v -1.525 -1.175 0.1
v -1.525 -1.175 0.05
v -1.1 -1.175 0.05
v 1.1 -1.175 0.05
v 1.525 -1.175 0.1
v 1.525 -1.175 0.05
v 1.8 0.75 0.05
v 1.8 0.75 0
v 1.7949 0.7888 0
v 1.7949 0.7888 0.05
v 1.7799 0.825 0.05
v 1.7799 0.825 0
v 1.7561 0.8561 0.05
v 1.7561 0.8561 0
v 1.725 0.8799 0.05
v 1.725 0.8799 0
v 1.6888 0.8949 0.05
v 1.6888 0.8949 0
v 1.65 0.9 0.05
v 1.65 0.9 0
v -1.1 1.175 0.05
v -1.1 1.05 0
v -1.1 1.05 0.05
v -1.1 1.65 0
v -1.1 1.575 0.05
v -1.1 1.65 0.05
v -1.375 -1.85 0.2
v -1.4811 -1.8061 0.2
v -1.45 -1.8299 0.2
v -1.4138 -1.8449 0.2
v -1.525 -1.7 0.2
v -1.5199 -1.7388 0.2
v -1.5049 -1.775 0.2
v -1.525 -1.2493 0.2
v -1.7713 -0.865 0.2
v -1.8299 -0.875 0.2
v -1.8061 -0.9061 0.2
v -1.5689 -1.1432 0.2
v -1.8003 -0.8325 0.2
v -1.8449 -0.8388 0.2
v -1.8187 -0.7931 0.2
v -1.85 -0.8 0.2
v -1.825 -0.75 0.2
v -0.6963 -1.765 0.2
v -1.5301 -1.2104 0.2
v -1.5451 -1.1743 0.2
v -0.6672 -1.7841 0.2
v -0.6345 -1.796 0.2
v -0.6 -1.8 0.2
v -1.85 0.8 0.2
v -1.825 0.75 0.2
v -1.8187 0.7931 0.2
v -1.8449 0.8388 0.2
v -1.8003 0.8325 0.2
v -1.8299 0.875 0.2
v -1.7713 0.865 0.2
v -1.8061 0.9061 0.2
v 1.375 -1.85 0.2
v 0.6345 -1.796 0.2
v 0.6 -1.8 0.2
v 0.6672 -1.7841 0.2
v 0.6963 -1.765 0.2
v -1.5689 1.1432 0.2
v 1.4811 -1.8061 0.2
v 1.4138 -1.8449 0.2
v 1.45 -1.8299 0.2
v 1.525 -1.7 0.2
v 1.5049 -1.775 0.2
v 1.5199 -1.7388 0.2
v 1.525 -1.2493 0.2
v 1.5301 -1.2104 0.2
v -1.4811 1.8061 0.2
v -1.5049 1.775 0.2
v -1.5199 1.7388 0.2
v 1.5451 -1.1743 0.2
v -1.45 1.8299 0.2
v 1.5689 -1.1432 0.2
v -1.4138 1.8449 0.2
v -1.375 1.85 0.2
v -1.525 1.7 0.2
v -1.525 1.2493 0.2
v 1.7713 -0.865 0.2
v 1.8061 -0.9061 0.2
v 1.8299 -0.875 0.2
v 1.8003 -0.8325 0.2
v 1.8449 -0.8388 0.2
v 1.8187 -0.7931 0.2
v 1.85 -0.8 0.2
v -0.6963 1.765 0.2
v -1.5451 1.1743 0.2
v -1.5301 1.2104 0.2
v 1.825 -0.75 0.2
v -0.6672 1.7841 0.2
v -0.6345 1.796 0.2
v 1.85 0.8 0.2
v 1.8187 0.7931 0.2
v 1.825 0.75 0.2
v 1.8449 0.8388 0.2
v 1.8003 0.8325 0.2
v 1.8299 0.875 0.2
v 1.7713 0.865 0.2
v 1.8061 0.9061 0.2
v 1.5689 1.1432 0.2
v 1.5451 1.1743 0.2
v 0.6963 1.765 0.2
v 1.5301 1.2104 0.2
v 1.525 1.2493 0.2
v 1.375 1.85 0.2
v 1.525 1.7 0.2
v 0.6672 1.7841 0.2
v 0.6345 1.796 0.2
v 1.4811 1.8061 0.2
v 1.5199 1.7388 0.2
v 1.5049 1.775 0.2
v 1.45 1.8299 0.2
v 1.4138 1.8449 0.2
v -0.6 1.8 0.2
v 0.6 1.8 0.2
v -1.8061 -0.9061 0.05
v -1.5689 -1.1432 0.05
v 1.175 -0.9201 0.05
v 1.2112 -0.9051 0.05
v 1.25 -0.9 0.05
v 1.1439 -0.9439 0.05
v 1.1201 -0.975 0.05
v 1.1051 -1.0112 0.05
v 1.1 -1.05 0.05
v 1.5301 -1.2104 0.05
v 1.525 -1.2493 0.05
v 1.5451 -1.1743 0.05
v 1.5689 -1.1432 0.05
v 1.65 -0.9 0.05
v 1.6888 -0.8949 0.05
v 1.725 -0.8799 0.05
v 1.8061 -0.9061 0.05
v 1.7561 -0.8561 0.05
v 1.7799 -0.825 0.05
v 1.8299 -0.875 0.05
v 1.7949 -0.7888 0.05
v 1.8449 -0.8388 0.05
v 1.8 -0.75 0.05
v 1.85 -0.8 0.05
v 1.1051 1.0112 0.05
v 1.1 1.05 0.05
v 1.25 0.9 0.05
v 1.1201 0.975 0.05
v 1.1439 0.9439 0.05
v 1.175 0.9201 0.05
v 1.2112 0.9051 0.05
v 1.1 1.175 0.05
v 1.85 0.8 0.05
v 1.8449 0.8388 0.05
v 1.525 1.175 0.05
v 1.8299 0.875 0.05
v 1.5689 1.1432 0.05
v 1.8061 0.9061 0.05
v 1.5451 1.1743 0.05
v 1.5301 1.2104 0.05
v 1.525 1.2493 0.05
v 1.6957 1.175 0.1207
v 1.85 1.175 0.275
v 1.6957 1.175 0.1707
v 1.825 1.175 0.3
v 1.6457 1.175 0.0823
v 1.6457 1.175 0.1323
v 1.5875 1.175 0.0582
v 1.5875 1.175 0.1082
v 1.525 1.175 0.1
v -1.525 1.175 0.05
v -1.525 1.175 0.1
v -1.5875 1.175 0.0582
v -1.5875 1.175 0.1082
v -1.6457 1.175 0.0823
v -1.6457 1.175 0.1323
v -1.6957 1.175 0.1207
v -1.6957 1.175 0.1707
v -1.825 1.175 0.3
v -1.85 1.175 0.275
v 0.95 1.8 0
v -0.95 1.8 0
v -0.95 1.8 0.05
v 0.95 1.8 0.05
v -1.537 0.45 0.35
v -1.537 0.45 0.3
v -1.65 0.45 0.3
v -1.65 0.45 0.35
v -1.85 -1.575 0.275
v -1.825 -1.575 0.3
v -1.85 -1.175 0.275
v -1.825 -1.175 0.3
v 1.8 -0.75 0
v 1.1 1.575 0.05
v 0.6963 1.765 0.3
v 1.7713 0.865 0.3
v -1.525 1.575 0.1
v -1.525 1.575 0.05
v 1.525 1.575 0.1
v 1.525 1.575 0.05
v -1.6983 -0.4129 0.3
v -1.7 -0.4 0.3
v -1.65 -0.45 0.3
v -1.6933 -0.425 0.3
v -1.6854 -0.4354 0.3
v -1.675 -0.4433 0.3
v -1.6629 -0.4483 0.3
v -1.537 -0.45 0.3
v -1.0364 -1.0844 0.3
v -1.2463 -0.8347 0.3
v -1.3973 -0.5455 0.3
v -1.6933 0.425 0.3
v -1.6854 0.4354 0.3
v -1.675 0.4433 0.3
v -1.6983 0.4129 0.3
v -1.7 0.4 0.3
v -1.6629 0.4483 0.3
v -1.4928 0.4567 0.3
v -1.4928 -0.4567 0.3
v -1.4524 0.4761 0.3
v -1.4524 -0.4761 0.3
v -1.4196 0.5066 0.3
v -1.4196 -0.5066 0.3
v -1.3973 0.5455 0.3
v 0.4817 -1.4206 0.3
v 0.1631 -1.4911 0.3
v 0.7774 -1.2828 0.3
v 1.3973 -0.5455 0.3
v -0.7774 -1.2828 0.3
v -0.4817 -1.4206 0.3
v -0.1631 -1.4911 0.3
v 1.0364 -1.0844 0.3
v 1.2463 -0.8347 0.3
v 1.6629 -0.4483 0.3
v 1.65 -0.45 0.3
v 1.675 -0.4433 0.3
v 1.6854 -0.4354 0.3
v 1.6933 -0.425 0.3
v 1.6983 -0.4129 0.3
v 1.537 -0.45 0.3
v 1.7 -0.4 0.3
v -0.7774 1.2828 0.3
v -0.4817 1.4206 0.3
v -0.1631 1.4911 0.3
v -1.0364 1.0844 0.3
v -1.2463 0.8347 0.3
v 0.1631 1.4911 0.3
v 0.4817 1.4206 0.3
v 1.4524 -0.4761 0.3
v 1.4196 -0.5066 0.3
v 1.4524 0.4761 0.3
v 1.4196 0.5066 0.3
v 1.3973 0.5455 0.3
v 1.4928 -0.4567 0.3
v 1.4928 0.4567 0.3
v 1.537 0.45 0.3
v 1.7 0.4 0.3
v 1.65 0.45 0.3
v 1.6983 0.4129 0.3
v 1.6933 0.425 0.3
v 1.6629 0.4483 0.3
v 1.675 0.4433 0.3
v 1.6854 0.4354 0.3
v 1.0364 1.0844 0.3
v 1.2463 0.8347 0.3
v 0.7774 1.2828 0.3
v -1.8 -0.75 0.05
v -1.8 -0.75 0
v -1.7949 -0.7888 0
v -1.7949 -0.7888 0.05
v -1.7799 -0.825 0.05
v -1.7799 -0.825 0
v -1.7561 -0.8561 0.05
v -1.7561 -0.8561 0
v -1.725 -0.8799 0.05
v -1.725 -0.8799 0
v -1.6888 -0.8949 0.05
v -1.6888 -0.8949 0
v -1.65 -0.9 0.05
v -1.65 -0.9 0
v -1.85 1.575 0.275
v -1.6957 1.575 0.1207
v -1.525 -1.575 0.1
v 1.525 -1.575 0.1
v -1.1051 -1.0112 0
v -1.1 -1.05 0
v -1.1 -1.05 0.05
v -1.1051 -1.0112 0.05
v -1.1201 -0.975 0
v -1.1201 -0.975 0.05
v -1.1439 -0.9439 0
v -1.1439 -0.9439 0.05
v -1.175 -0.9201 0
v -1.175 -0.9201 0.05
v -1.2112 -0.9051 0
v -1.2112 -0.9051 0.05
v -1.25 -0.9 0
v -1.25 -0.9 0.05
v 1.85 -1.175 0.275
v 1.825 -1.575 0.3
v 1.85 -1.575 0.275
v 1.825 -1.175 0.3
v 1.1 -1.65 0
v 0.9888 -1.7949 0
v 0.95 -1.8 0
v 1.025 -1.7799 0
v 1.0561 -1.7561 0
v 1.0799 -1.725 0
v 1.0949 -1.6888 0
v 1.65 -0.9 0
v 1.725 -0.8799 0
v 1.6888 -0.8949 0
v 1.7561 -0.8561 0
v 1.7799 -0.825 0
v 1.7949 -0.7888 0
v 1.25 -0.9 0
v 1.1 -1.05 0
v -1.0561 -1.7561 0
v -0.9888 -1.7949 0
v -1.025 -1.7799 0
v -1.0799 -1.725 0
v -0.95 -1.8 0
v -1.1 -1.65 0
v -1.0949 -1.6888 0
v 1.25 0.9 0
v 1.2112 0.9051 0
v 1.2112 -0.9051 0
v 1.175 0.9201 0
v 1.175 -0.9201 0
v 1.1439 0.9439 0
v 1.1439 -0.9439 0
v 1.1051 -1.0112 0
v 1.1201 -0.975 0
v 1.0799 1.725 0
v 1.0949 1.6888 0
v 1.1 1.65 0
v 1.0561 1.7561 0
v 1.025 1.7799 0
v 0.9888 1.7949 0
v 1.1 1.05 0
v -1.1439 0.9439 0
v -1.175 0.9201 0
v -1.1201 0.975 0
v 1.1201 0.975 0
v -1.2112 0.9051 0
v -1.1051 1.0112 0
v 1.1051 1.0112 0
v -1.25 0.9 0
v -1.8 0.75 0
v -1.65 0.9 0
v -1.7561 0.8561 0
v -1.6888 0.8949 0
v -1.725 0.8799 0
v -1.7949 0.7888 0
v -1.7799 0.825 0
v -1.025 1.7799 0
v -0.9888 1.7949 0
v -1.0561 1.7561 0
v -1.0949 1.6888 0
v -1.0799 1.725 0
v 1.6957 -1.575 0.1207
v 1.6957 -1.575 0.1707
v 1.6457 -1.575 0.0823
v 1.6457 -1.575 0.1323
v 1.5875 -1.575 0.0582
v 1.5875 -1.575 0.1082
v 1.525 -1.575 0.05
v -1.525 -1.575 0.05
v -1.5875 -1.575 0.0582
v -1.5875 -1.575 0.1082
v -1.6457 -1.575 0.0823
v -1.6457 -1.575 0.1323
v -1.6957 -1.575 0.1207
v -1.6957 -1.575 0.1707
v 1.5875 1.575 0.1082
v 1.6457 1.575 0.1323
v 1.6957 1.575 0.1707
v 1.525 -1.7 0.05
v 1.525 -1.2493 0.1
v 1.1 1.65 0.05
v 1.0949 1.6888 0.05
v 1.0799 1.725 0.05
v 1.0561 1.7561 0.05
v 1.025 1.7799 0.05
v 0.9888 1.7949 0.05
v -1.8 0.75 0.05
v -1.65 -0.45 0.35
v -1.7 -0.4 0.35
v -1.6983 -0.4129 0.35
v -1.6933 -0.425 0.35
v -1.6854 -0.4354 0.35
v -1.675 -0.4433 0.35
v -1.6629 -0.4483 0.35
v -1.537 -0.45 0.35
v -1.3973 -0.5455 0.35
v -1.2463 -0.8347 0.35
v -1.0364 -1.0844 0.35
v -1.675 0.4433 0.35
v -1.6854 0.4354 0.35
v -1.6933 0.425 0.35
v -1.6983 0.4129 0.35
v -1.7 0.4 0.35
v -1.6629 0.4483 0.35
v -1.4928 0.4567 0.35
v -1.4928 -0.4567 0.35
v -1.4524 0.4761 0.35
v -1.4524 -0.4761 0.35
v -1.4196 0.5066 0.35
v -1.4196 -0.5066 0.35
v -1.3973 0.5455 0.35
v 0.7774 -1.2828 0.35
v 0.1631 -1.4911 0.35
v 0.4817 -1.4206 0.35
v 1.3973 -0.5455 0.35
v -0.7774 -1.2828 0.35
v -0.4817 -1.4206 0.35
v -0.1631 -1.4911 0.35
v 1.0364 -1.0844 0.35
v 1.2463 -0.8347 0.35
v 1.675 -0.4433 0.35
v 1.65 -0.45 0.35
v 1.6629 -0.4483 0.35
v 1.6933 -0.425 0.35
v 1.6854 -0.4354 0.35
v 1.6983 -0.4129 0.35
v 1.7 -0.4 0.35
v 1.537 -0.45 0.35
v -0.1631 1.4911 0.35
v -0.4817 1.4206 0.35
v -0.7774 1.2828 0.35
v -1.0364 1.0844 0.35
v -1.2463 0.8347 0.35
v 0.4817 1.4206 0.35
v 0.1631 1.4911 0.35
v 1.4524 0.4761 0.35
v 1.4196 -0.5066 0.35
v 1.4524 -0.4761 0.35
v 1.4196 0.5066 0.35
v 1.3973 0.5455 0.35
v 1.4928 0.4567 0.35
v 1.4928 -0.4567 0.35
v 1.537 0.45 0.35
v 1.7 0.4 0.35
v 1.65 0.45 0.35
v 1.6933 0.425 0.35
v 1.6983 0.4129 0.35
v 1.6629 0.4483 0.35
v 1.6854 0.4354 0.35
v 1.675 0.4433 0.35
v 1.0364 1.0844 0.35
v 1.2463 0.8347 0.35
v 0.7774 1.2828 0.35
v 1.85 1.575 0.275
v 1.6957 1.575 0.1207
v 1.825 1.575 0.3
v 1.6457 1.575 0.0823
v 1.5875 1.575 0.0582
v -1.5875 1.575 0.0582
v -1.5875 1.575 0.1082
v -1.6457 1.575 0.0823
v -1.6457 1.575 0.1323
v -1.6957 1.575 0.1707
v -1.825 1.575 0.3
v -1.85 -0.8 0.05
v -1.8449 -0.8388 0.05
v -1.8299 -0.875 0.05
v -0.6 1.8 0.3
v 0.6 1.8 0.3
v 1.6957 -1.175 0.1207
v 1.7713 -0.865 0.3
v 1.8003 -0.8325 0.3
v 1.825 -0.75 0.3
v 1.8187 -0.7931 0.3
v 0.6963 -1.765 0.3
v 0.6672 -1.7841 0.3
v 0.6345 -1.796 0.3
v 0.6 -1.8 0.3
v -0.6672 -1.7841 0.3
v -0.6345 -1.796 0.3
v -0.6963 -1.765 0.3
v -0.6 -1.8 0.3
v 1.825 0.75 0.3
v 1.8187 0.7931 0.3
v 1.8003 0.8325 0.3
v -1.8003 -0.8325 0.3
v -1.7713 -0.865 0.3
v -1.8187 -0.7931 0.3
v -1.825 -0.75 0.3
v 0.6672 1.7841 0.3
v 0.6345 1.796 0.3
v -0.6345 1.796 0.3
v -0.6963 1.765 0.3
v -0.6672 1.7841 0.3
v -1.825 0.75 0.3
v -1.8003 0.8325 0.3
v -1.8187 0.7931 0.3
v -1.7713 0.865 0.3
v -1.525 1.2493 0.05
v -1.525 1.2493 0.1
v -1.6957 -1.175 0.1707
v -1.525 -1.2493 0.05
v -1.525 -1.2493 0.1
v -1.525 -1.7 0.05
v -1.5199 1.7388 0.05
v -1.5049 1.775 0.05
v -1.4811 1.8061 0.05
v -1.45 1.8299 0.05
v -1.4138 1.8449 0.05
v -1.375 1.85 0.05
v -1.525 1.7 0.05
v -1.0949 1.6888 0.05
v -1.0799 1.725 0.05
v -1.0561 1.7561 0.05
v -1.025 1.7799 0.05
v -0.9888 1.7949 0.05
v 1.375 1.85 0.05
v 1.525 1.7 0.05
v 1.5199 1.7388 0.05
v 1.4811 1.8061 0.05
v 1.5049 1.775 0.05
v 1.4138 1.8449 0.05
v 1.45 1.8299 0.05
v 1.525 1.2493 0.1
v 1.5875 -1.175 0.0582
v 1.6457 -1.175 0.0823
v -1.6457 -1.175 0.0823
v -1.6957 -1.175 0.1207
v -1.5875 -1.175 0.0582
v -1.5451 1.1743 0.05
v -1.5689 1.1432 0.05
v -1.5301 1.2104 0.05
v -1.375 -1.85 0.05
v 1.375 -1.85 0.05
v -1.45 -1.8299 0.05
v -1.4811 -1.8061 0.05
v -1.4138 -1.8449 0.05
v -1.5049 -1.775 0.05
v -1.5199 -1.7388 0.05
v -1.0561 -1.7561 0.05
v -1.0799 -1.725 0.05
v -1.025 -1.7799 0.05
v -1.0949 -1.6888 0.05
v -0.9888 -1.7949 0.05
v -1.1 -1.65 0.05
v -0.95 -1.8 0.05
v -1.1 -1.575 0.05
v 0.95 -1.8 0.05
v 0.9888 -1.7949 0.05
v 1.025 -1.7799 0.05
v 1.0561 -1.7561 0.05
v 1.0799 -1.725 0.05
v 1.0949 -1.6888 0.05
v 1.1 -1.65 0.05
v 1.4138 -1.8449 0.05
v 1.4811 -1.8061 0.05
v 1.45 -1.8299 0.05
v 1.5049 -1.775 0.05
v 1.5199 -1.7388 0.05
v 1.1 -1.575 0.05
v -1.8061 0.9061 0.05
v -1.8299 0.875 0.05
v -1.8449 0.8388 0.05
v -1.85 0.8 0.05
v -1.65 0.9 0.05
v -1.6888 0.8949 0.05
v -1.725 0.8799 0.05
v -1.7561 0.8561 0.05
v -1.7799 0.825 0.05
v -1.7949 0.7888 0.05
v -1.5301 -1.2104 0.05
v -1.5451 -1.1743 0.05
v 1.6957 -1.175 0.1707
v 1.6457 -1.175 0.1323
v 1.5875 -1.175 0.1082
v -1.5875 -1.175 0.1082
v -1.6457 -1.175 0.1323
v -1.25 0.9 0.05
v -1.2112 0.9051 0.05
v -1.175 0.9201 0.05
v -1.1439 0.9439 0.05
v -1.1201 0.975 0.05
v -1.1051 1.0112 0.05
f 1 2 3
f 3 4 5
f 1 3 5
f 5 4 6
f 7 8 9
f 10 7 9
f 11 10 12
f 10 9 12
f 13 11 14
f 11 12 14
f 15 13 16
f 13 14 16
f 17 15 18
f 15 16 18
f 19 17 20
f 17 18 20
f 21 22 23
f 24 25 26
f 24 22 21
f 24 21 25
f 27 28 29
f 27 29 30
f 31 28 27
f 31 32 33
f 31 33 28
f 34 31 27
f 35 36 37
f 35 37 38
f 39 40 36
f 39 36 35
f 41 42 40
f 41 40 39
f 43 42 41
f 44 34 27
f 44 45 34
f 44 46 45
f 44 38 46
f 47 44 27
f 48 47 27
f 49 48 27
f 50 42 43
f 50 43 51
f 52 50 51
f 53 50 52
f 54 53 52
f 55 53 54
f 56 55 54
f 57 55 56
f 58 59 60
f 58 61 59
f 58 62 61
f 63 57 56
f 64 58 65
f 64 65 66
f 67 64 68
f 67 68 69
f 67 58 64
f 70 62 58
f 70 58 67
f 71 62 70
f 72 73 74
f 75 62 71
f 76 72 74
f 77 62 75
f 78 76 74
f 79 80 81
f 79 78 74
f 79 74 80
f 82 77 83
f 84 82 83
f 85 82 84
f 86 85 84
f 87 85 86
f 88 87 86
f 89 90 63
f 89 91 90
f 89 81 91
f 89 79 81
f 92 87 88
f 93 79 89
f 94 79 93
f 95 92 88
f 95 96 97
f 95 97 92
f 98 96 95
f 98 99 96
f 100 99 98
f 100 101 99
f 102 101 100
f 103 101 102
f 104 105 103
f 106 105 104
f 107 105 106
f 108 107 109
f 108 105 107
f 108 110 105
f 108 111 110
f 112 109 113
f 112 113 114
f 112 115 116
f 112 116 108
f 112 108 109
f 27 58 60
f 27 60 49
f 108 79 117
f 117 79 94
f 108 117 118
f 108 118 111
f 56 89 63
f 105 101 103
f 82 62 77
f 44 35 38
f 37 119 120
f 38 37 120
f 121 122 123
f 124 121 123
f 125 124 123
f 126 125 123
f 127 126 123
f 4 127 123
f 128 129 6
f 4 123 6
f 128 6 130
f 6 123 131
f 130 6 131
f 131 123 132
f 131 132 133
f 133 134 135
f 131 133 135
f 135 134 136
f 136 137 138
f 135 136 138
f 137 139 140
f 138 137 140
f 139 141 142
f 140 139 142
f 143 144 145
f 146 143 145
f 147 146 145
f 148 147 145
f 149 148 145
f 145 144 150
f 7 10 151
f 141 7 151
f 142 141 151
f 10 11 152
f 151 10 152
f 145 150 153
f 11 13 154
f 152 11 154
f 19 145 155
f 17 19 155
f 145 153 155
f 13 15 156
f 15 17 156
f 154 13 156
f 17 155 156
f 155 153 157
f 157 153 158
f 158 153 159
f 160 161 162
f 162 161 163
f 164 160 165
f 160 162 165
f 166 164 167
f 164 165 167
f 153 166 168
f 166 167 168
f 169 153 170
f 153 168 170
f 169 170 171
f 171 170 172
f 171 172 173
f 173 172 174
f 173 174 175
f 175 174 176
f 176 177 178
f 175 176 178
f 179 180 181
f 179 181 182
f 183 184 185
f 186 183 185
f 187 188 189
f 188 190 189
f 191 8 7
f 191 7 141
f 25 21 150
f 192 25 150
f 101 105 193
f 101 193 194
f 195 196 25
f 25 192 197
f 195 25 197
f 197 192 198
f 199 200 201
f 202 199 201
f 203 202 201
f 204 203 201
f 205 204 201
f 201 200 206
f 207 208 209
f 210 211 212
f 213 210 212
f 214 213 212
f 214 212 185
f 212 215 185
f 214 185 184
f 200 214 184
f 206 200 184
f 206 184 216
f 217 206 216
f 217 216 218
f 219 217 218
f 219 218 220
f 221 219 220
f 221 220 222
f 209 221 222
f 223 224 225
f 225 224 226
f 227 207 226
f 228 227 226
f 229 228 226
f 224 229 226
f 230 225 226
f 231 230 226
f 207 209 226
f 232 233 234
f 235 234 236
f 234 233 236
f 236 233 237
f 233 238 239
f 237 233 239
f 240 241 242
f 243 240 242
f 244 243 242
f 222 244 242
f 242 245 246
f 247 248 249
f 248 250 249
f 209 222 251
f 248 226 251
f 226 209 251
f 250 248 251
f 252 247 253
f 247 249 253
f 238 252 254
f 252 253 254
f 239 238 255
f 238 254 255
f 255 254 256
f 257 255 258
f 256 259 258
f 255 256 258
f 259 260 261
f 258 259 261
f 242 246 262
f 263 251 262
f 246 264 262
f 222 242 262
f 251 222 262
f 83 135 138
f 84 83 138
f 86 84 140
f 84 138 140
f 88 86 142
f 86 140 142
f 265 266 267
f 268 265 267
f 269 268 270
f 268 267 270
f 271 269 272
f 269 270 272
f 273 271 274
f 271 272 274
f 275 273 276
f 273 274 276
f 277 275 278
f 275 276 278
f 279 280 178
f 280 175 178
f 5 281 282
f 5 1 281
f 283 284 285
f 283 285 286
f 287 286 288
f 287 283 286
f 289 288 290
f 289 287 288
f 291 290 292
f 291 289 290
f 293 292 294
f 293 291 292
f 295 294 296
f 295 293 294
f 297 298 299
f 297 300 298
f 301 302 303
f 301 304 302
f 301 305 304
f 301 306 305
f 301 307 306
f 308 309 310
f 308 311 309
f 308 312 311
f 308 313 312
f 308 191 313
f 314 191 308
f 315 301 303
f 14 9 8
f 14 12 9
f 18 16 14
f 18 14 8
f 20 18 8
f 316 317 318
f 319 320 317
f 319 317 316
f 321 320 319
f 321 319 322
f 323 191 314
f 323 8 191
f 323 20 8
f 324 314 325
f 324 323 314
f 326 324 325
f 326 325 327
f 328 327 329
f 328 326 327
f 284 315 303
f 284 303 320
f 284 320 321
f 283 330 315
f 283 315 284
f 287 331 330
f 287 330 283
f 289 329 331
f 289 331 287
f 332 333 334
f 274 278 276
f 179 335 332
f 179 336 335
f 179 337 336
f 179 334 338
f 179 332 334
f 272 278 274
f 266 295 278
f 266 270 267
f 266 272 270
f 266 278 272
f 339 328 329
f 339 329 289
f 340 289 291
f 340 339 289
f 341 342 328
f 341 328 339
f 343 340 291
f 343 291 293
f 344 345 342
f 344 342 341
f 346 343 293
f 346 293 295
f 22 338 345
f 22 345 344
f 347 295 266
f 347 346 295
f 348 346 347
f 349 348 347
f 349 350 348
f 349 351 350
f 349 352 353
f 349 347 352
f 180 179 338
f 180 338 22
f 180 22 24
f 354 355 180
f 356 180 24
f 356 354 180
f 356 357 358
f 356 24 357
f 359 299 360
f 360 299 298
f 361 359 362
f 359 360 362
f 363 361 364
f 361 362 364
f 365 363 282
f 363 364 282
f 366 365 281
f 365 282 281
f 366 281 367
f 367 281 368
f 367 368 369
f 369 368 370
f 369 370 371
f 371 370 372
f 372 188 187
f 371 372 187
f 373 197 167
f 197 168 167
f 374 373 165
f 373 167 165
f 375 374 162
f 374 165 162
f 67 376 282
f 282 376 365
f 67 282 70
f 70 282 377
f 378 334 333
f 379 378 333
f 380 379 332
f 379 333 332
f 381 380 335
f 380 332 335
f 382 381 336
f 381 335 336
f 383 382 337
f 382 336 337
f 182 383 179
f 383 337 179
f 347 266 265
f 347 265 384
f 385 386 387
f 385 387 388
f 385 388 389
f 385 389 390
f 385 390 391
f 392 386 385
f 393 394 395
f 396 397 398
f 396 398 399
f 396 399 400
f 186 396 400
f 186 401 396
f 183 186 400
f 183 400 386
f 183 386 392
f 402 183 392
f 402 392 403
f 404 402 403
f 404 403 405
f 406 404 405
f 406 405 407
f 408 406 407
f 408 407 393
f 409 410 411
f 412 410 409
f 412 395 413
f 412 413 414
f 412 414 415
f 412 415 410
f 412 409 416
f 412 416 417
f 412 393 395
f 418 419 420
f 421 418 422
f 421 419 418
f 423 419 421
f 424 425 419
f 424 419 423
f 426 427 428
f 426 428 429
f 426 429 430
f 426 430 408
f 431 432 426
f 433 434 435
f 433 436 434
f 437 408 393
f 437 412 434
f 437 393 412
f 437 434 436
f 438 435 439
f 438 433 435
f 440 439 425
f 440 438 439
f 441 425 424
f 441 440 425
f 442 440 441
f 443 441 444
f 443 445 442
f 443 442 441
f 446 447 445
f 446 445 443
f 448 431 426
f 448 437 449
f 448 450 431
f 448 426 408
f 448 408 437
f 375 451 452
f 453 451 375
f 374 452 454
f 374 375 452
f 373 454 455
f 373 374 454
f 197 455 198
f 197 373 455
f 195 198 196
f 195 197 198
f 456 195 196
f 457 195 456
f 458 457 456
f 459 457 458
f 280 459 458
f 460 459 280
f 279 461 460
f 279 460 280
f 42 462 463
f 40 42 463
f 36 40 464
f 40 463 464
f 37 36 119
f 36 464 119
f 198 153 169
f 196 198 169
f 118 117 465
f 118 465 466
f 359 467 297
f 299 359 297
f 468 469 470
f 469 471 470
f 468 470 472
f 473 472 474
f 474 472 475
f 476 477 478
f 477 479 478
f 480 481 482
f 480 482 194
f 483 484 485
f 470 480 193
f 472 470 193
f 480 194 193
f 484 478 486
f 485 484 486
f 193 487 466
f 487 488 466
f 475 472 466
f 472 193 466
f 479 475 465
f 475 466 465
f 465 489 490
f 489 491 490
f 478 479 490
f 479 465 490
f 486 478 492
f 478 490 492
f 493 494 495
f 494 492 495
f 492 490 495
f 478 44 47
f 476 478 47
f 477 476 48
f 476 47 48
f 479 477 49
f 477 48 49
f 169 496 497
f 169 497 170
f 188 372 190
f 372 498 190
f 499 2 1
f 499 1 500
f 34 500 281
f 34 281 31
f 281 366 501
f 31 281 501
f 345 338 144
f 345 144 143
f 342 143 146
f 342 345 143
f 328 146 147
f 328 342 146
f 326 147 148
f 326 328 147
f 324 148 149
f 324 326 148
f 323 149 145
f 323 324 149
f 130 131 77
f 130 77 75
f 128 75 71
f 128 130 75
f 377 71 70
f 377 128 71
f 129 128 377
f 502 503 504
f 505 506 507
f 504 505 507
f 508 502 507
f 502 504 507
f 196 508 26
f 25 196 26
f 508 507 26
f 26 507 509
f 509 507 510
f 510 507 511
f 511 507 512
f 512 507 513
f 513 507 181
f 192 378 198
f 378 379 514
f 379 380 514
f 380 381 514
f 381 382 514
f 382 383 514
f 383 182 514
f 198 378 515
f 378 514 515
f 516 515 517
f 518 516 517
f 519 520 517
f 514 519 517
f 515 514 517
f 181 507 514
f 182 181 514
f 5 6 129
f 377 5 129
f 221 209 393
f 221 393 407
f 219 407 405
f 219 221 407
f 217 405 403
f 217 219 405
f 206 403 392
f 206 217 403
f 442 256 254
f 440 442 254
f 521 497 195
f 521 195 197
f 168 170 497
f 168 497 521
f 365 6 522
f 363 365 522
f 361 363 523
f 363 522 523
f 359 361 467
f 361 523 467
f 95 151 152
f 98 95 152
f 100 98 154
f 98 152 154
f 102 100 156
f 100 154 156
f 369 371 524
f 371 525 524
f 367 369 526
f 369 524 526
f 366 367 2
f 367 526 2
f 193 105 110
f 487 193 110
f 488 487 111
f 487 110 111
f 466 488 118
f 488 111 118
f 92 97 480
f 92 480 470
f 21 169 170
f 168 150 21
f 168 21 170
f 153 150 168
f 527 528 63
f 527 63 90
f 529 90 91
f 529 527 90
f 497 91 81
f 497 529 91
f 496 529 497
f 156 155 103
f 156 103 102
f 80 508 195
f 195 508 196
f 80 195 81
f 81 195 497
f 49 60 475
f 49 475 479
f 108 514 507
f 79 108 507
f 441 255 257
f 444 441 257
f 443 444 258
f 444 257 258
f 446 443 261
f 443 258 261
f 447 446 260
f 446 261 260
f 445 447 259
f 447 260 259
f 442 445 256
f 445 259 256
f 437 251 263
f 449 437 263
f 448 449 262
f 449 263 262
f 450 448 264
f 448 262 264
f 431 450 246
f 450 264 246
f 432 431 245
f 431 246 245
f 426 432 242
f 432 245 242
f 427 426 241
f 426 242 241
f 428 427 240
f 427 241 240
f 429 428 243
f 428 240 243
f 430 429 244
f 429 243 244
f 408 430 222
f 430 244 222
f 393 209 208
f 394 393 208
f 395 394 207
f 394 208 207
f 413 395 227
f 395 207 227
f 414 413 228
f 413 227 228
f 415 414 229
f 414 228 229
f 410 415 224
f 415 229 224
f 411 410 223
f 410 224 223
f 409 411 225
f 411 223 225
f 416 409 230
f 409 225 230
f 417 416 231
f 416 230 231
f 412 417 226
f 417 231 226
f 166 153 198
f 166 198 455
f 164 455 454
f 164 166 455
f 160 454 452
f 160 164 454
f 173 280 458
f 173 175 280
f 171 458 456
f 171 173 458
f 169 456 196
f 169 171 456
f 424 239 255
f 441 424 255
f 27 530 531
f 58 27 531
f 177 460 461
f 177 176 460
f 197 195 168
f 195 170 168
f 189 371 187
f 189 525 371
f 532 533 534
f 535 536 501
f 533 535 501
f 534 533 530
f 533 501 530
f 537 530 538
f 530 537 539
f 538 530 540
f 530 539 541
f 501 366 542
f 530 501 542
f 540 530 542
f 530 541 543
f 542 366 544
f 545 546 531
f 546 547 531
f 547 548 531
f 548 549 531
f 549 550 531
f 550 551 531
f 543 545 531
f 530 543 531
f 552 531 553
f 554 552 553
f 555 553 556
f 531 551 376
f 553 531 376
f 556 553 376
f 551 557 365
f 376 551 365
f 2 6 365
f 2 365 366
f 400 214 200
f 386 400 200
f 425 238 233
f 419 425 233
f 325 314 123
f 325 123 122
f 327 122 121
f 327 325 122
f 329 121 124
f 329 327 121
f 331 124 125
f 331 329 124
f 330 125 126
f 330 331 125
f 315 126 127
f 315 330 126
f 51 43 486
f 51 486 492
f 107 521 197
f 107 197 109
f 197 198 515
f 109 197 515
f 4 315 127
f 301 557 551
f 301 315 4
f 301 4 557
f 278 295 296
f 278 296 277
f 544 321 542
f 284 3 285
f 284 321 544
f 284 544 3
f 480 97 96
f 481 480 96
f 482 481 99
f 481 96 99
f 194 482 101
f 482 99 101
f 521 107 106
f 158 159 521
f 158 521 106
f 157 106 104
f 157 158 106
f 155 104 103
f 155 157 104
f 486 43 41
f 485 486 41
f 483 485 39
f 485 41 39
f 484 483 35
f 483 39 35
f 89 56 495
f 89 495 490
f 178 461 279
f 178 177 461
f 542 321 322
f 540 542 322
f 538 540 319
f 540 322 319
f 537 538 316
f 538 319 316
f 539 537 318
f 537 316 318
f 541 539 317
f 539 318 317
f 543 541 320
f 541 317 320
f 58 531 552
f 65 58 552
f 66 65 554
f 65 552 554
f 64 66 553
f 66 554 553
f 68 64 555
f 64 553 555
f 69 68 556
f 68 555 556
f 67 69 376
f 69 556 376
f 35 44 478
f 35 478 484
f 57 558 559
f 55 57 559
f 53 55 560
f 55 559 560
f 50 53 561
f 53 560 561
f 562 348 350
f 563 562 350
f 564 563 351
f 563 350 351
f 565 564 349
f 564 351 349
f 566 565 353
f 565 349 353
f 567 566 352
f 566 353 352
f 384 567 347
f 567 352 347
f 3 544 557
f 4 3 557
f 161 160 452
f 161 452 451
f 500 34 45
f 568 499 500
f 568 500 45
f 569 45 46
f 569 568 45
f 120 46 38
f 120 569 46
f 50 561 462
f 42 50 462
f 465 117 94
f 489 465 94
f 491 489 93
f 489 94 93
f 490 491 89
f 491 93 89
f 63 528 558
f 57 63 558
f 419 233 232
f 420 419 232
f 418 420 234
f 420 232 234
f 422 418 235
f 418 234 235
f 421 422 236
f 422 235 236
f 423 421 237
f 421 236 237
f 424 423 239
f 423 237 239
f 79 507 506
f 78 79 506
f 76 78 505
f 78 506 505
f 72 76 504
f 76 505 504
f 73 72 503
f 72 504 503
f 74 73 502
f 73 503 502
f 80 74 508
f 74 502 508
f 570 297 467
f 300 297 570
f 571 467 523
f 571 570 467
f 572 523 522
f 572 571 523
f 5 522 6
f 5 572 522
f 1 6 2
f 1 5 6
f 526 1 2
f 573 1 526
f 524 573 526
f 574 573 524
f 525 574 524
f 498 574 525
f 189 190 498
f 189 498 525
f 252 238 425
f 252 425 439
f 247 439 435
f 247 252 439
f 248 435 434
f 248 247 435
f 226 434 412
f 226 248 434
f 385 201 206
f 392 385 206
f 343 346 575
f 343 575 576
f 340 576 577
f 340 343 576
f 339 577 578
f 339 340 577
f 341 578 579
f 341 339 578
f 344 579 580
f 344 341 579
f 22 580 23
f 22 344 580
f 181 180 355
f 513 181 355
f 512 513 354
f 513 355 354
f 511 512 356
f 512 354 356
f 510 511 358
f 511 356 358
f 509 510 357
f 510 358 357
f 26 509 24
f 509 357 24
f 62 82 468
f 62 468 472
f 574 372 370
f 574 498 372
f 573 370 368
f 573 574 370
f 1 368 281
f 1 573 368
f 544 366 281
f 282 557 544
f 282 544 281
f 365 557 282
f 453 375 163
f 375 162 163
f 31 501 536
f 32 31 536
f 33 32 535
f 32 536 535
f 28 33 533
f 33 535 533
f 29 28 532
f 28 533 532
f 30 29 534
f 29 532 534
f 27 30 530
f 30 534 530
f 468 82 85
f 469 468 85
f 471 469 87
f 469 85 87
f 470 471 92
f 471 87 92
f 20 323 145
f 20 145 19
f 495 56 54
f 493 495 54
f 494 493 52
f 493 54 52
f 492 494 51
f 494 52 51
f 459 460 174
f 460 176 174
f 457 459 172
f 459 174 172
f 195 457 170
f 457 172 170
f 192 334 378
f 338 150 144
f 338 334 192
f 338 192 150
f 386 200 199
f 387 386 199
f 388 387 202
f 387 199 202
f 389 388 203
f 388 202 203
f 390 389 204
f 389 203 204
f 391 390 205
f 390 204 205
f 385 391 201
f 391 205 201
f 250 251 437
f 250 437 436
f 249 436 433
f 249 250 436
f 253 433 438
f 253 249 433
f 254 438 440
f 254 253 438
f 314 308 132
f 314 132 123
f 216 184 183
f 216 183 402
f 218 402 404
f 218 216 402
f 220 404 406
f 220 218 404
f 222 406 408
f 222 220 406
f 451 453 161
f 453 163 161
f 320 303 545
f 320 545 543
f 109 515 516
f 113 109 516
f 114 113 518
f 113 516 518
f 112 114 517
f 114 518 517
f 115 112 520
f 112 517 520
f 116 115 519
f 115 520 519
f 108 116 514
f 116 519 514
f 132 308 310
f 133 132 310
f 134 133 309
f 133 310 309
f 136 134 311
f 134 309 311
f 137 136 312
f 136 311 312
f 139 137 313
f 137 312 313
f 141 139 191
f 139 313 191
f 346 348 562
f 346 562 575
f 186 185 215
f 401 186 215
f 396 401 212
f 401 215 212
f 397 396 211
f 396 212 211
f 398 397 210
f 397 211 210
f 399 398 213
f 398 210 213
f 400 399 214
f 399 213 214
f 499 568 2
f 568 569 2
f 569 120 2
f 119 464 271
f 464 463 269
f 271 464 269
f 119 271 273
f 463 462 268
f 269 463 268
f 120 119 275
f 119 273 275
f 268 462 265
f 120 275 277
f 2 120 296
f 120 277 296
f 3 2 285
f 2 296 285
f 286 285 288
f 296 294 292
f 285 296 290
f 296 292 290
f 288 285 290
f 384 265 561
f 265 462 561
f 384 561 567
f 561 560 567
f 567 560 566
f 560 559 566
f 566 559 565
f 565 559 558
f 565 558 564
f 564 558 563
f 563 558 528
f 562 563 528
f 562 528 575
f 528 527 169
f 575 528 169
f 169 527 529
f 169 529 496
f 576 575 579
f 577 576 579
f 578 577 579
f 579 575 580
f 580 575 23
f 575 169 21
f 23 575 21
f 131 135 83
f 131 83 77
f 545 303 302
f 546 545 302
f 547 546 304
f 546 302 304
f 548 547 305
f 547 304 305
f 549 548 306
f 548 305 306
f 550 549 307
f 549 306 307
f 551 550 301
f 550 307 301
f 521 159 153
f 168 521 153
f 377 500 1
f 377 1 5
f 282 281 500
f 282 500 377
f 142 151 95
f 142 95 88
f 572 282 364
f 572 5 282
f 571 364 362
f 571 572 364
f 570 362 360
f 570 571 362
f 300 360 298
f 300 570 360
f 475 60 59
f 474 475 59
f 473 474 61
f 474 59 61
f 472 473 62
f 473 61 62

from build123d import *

# Parameters (mm, degrees)
PAD001_DEPTH = 0.05
PAD002_DEPTH = 0.15
SKETCH_W     = 3.05
SKETCH_H     = 0.4
POCKET_DEPTH = 0.05
PAD003_DEPTH = 0.1
PAD005_DEPTH = 0.2
PAD_DEPTH    = 0.05


with BuildPart() as base:
    # Sketch001 (on XY_Plane of Origin) → Pad001 (new body)
    with BuildSketch(Plane.XY):
        with BuildLine():
            Line((-0.95, 1.8), (0.95, 1.8))
            ThreePointArc((1.1, 1.65), (1.056066, 1.756066), (0.95, 1.8))
            Line((1.1, 1.65), (1.1, 1.05))
            ThreePointArc((1.1, 1.05), (1.143934, 0.943934), (1.25, 0.9))
            Line((1.25, 0.9), (1.65, 0.9))
            ThreePointArc((1.8, 0.75), (1.756066, 0.856066), (1.65, 0.9))
            Line((1.8, 0.75), (1.8, -0.75))
            ThreePointArc((1.65, -0.9), (1.756066, -0.856066), (1.8, -0.75))
            Line((1.65, -0.9), (1.25, -0.9))
            ThreePointArc((1.25, -0.9), (1.143934, -0.943934), (1.1, -1.05))
            Line((1.1, -1.05), (1.1, -1.65))
            ThreePointArc((0.95, -1.8), (1.056066, -1.756066), (1.1, -1.65))
            Line((0.95, -1.8), (-0.95, -1.8))
            ThreePointArc((-1.1, -1.65), (-1.056066, -1.756066), (-0.95, -1.8))
            Line((-1.1, -1.65), (-1.1, -1.05))
            ThreePointArc((-1.1, -1.05), (-1.143934, -0.943934), (-1.25, -0.9))
            Line((-1.25, -0.9), (-1.65, -0.9))
            ThreePointArc((-1.8, -0.75), (-1.756066, -0.856066), (-1.65, -0.9))
            Line((-1.8, -0.75), (-1.8, 0.75))
            ThreePointArc((-1.65, 0.9), (-1.756066, 0.856066), (-1.8, 0.75))
            Line((-1.65, 0.9), (-1.25, 0.9))
            ThreePointArc((-1.25, 0.9), (-1.143934, 0.943934), (-1.1, 1.05))
            Line((-1.1, 1.05), (-1.1, 1.65))
            ThreePointArc((-0.95, 1.8), (-1.056066, 1.756066), (-1.1, 1.65))
        make_face()
    extrude(amount=PAD001_DEPTH)

    # Sketch002 (on XY_Plane of Origin) → Pad002 (join)
    with BuildSketch(Plane.XY.offset(0.05)):
        with BuildLine():
            Line((-1.525, 1.7), (-1.525, 1.249264))
            ThreePointArc((-1.568934, 1.143198), (-1.536418, 1.191862), (-1.525, 1.249264))
            Line((-1.568934, 1.143198), (-1.806066, 0.906066))
            ThreePointArc((-1.806066, 0.906066), (-1.838582, 0.857403), (-1.85, 0.8))
            Line((-1.85, 0.8), (-1.85, -0.8))
            ThreePointArc((-1.85, -0.8), (-1.838582, -0.857403), (-1.806066, -0.906066))
            Line((-1.806066, -0.906066), (-1.568934, -1.143198))
            ThreePointArc((-1.525, -1.249264), (-1.536418, -1.191862), (-1.568934, -1.143198))
            Line((-1.525, -1.249264), (-1.525, -1.7))
            ThreePointArc((-1.525, -1.7), (-1.481066, -1.806066), (-1.375, -1.85))
            Line((-1.375, -1.85), (1.375, -1.85))
            ThreePointArc((1.375, -1.85), (1.481066, -1.806066), (1.525, -1.7))
            Line((1.525, -1.7), (1.525, -1.249264))
            ThreePointArc((1.568934, -1.143198), (1.536418, -1.191862), (1.525, -1.249264))
            Line((1.806066, -0.906066), (1.568934, -1.143198))
            ThreePointArc((1.806066, -0.906066), (1.838582, -0.857403), (1.85, -0.8))
            Line((1.85, 0.8), (1.85, -0.8))
            ThreePointArc((1.85, 0.8), (1.838582, 0.857403), (1.806066, 0.906066))
            Line((1.568934, 1.143198), (1.806066, 0.906066))
            ThreePointArc((1.525, 1.249264), (1.536418, 1.191862), (1.568934, 1.143198))
            Line((1.525, 1.249264), (1.525, 1.7))
            ThreePointArc((1.525, 1.7), (1.481066, 1.806066), (1.375, 1.85))
            Line((1.375, 1.85), (-1.375, 1.85))
            ThreePointArc((-1.375, 1.85), (-1.481066, 1.806066), (-1.525, 1.7))
        make_face()
    extrude(amount=PAD002_DEPTH)

    # Sketch (on Face5 of Pad002) → Pocket (cut)
    with BuildSketch(Plane(origin=(0, 0, 0.05), x_dir=(1, 0, 0), z_dir=(0, 0, -1))):
        with Locations((0, 1.375)):
            Rectangle(SKETCH_W, SKETCH_H)
        with Locations((0, -1.375)):
            Rectangle(SKETCH_W, SKETCH_H)
    extrude(amount=-POCKET_DEPTH, mode=Mode.SUBTRACT)

    # Sketch003 (on XY_Plane of Origin) → Pad003 (join)
    with BuildSketch(Plane.XY.offset(0.2)):
        with BuildLine():
            Line((-1.77129, 0.865014), (-0.69629, 1.765014))
            ThreePointArc((-0.6, 1.8), (-0.651225, 1.790982), (-0.69629, 1.765014))
            Line((-0.6, 1.8), (0.6, 1.8))
            ThreePointArc((0.69629, 1.765014), (0.651225, 1.790982), (0.6, 1.8))
            Line((0.69629, 1.765014), (1.77129, 0.865014))
            ThreePointArc((1.825, 0.75), (1.810911, 0.813468), (1.77129, 0.865014))
            Line((1.825, 0.75), (1.825, -0.75))
            ThreePointArc((1.77129, -0.865014), (1.810911, -0.813468), (1.825, -0.75))
            Line((1.77129, -0.865014), (0.69629, -1.765014))
            ThreePointArc((0.6, -1.8), (0.651225, -1.790982), (0.69629, -1.765014))
            Line((0.6, -1.8), (-0.6, -1.8))
            ThreePointArc((-0.69629, -1.765014), (-0.651225, -1.790982), (-0.6, -1.8))
            Line((-0.69629, -1.765014), (-1.77129, -0.865014))
            ThreePointArc((-1.825, -0.75), (-1.810911, -0.813468), (-1.77129, -0.865014))
            Line((-1.825, -0.75), (-1.825, 0.75))
            ThreePointArc((-1.77129, 0.865014), (-1.810911, 0.813468), (-1.825, 0.75))
        make_face()
    extrude(amount=PAD003_DEPTH)


with BuildPart() as leads:
    # Sketch005 (on XZ_Plane of Origin) → Pad005 (new body, symmetric)
    with BuildSketch(Plane(origin=(0, 1.375, 0.05), x_dir=(1, 0, 0), z_dir=(0, -1, 0))):
        with BuildLine():
            Line((1.525, 0), (-1.525, 0))
            ThreePointArc((-1.695711, 0.070711), (-1.617388, 0.018377), (-1.525, 0))
            Line((-1.695711, 0.070711), (-1.85, 0.225))
            Line((-1.825, 0.25), (-1.85, 0.225))
            Line((-1.695711, 0.120711), (-1.825, 0.25))
            ThreePointArc((-1.695711, 0.120711), (-1.617388, 0.068377), (-1.525, 0.05))
            Line((-1.525, 0.05), (1.525, 0.05))
            ThreePointArc((1.525, 0.05), (1.617388, 0.068377), (1.695711, 0.120711))
            Line((1.695711, 0.120711), (1.825, 0.25))
            Line((1.825, 0.25), (1.85, 0.225))
            Line((1.695711, 0.070711), (1.85, 0.225))
            ThreePointArc((1.525, 0), (1.617388, 0.018377), (1.695711, 0.070711))
        make_face()
    pad005 = extrude(amount=PAD005_DEPTH, both=True)

    # Mirrored001: Pad005 across XZ
    add(pad005.mirror(Plane.XZ))


with BuildPart() as actuator:
    # Sketch006 (on XY_Plane of Origin) → Pad (new body)
    with BuildSketch(Plane.XY.offset(0.3)):
        with BuildLine():
            ThreePointArc((-1.397311, -0.545455), (0, -1.5), (1.397311, -0.545455))
            ThreePointArc((1.537043, -0.45), (1.452431, -0.476142), (1.397311, -0.545455))
            Line((1.537043, -0.45), (1.65, -0.45))
            ThreePointArc((1.65, -0.45), (1.685355, -0.435355), (1.7, -0.4))
            Line((1.7, -0.4), (1.7, 0.4))
            ThreePointArc((1.7, 0.4), (1.685355, 0.435355), (1.65, 0.45))
            Line((1.65, 0.45), (1.537043, 0.45))
            ThreePointArc((1.397311, 0.545455), (1.452431, 0.476142), (1.537043, 0.45))
            ThreePointArc((1.397311, 0.545455), (0, 1.5), (-1.397311, 0.545455))
            ThreePointArc((-1.537043, 0.45), (-1.452431, 0.476142), (-1.397311, 0.545455))
            Line((-1.537043, 0.45), (-1.65, 0.45))
            ThreePointArc((-1.65, 0.45), (-1.685355, 0.435355), (-1.7, 0.4))
            Line((-1.7, 0.4), (-1.7, -0.4))
            ThreePointArc((-1.7, -0.4), (-1.685355, -0.435355), (-1.65, -0.45))
            Line((-1.65, -0.45), (-1.537043, -0.45))
            ThreePointArc((-1.397311, -0.545455), (-1.452431, -0.476142), (-1.537043, -0.45))
        make_face()
    extrude(amount=PAD_DEPTH)


solid = Compound([base.part, leads.part, actuator.part])
